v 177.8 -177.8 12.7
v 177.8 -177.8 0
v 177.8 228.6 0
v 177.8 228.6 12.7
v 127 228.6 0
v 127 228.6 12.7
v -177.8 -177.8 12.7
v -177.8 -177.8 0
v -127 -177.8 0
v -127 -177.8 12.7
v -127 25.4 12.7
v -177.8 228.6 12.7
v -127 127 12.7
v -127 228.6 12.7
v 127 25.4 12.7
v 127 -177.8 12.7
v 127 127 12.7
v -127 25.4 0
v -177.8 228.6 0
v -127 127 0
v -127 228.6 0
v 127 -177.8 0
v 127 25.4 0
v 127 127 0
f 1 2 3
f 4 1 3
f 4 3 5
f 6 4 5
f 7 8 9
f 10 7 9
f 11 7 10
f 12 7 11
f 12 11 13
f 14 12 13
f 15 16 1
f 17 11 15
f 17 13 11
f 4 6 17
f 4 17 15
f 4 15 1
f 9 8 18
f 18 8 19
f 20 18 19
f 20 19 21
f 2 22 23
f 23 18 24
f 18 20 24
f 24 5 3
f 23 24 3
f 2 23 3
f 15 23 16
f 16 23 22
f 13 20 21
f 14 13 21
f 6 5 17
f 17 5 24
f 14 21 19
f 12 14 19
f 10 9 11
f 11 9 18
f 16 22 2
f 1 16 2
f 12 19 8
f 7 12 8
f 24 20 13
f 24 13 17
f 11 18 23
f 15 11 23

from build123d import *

# Parameters (mm, degrees)
F0_W     = 254
F0_H     = 101.6
F1_DEPTH = 12.7


with BuildPart() as f1:
    # F0 (on Top) → F1 (new body)
    with BuildSketch(Plane.XY):
        with Locations((0, 76.2)):
            Rectangle(F0_W, F0_H)
        Polygon((-177.8, 228.6), (-177.8, -177.8), (-127, -177.8), (-127, 25.4), (-127, 127), (-127, 228.6), align=None)
        Polygon((127, 127), (127, 25.4), (127, -177.8), (177.8, -177.8), (177.8, 228.6), (127, 228.6), align=None)
    extrude(amount=F1_DEPTH)


solid = f1.part
